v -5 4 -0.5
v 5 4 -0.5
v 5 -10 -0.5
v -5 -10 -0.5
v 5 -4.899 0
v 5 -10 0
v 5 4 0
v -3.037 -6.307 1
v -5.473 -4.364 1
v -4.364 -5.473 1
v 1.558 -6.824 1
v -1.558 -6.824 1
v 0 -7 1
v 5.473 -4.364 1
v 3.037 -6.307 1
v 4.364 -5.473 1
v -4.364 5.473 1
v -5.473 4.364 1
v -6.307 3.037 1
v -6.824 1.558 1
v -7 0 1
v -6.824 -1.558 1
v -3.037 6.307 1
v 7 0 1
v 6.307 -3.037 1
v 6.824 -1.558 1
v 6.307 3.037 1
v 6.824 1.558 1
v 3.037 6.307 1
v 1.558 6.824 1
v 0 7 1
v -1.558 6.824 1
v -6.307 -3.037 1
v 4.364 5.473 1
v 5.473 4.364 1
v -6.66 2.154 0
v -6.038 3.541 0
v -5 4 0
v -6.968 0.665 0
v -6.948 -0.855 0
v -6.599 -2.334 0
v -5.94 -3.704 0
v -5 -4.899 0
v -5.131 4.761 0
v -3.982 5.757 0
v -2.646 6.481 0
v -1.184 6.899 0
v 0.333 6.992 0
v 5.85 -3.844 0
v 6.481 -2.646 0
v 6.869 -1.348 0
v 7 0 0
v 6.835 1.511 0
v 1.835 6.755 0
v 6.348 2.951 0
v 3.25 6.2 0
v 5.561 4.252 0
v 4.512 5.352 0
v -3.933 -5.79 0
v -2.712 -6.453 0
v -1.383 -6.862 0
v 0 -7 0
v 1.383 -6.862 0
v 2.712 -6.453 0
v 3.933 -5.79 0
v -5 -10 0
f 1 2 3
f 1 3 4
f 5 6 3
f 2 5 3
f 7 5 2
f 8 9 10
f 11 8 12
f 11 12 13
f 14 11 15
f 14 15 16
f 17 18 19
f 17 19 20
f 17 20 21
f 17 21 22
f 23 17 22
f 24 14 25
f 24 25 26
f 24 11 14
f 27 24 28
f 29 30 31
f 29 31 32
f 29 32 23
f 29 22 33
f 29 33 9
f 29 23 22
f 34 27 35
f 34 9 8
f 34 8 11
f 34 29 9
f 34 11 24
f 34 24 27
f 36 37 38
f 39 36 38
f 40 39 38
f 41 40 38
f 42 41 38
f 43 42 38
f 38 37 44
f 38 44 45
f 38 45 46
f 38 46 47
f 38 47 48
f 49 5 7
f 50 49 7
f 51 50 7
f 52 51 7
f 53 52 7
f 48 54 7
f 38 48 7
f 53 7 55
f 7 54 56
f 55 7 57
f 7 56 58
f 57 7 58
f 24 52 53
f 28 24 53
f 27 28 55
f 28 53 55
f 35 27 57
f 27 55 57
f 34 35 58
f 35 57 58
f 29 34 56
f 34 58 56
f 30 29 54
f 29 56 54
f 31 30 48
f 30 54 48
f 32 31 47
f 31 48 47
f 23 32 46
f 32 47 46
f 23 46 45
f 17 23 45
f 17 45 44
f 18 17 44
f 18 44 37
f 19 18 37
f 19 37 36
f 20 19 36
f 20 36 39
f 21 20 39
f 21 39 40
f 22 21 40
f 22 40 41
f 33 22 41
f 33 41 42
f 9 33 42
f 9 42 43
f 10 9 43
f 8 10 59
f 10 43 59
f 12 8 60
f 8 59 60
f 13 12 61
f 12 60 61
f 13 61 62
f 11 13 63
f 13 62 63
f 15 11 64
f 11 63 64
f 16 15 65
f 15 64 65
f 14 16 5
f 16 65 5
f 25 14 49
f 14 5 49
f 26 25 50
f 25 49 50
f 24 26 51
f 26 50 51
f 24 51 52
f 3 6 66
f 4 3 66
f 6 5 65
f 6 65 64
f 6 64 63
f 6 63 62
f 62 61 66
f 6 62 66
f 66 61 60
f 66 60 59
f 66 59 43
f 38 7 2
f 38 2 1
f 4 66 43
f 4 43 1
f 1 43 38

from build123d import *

# Parameters (mm, degrees)
SKETCH1_R           = 7
BOSS_EXTRUDE1_DEPTH = 1
SKETCH2_W           = 10
SKETCH2_H           = 14
BOSS_EXTRUDE2_DEPTH = 0.5


with BuildPart() as part:
    # Sketch1 → Boss-Extrude1 (new body)
    with BuildSketch(Plane.XY):
        Circle(SKETCH1_R)
    extrude(amount=BOSS_EXTRUDE1_DEPTH)

    # Sketch2 → Boss-Extrude2 (add)
    with BuildSketch(Plane(origin=(0, 0, 0), x_dir=(-1, 0, 0), z_dir=(0, 0, -1))):
        with Locations((0, -3)):
            Rectangle(SKETCH2_W, SKETCH2_H)
    extrude(amount=BOSS_EXTRUDE2_DEPTH)


solid = part.part
